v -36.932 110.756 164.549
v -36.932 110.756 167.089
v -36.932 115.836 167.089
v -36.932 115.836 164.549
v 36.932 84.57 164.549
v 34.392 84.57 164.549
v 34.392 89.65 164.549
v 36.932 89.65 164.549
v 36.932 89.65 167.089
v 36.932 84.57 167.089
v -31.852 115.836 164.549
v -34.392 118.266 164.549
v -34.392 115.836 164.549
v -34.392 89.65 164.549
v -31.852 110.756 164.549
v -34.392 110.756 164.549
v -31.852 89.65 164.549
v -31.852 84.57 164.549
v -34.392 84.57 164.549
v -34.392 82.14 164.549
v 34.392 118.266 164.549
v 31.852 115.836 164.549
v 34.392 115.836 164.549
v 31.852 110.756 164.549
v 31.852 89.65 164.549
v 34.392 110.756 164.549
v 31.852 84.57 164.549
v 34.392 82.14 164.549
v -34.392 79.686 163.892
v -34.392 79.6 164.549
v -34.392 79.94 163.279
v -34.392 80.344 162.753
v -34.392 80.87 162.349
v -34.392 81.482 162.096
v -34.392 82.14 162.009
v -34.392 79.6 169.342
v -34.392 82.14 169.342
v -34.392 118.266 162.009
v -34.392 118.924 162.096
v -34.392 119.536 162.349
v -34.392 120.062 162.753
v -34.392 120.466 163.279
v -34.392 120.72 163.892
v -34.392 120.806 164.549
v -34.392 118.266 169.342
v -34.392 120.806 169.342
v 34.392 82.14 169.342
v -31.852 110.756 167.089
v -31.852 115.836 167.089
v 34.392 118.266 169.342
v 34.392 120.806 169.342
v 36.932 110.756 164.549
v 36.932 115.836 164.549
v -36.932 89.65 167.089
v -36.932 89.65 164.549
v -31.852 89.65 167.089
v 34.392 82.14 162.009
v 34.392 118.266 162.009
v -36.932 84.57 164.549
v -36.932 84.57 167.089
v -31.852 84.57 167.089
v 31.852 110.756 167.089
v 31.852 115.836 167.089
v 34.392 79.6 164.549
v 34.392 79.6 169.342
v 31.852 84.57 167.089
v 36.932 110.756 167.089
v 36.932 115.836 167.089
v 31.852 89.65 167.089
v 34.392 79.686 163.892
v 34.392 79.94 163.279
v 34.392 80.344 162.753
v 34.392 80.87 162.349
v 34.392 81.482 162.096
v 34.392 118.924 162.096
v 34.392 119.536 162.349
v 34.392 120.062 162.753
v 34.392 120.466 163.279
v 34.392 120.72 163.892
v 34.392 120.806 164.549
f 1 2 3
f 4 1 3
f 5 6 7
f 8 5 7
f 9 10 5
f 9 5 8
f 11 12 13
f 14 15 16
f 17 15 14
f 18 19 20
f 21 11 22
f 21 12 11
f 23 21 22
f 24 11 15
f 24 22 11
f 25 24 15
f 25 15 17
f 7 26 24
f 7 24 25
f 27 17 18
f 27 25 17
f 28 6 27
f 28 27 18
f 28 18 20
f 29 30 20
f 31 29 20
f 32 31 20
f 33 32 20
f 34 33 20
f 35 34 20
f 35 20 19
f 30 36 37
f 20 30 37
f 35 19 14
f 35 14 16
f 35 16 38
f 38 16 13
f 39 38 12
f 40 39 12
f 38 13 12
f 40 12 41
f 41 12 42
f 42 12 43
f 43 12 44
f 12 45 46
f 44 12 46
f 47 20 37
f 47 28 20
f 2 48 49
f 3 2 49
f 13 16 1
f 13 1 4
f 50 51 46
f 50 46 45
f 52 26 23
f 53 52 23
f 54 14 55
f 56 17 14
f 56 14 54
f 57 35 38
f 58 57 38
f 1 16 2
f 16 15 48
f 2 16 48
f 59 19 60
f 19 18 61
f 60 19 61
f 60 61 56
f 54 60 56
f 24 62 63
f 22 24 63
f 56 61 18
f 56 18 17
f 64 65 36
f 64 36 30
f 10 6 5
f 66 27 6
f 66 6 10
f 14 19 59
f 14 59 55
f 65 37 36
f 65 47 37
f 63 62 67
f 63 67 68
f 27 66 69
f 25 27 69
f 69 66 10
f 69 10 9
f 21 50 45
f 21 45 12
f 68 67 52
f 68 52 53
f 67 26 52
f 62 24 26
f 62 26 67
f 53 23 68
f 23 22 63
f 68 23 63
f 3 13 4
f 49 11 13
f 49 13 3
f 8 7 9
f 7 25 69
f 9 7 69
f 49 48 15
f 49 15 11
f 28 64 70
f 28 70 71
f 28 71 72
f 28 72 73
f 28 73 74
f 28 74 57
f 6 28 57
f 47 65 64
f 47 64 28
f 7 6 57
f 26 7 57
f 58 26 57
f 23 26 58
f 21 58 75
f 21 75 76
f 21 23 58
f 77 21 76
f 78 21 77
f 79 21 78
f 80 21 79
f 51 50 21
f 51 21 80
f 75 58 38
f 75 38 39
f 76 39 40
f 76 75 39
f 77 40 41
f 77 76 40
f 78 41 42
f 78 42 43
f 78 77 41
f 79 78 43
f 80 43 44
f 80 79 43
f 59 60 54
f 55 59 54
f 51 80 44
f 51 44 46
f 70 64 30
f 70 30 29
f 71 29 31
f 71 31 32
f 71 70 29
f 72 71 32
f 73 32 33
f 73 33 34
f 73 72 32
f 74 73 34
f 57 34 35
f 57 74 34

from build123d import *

# Parameters (mm, degrees)
F1_DEPTH = 34.3916
F2_START = 31.8516
F0_W     = 5.08
F0_H     = 2.54
F2_DEPTH = 5.08
F3_START = -31.8516
F3_DEPTH = 5.08


with BuildPart() as f1:
    # F0 (on Right) → F1 (new body, symmetric)
    with BuildSketch(Plane.YZ):
        with BuildLine():
            Line((82.1398573303, 169.3418), (79.5998573303, 169.3418))
            Line((79.5998573303, 169.3418), (79.5998573303, 164.5491375))
            ThreePointArc((79.5998573303, 164.5491375), (80.3438061061, 162.7530862758), (82.1398573303, 162.0091375))
            Line((82.1398573303, 162.0091375), (100.203, 162.0091375))
            Line((100.203, 162.0091375), (100.203, 164.5491375))
            Line((100.203, 164.5491375), (89.6502663064, 164.5491375))
            Line((89.6502663064, 164.5491375), (84.5702663064, 164.5491375))
            Line((84.5702663064, 164.5491375), (82.1398573303, 164.5491375))
            Line((82.1398573303, 164.5491375), (82.1398573303, 169.3418))
        make_face()
        with BuildLine():
            Line((120.8061426697, 169.3418), (118.2661426697, 169.3418))
            Line((118.2661426697, 169.3418), (118.2661426697, 164.5491375))
            Line((118.2661426697, 164.5491375), (115.8357336936, 164.5491375))
            Line((115.8357336936, 164.5491375), (110.7557336936, 164.5491375))
            Line((110.7557336936, 164.5491375), (100.203, 164.5491375))
            Line((100.203, 164.5491375), (100.203, 162.0091375))
            Line((100.203, 162.0091375), (118.2661426697, 162.0091375))
            ThreePointArc((118.2661426697, 162.0091375), (120.0621938939, 162.7530862758), (120.8061426697, 164.5491375))
            Line((120.8061426697, 164.5491375), (120.8061426697, 169.3418))
        make_face()
    extrude(amount=F1_DEPTH, both=True)

    # F0 (on Right) → F2 (join)
    with BuildSketch(Plane.YZ.offset(F2_START)):
        with Locations((87.1102663064, 165.8191375)):
            Rectangle(F0_W, F0_H)
        with Locations((113.2957336936, 165.8191375)):
            Rectangle(F0_W, F0_H)
    extrude(amount=F2_DEPTH)

    # F0 (on Right) → F3 (join)
    with BuildSketch(Plane.YZ.offset(F3_START)):
        with Locations((87.1102663064, 165.8191375)):
            Rectangle(F0_W, F0_H)
        with Locations((113.2957336936, 165.8191375)):
            Rectangle(F0_W, F0_H)
    extrude(amount=-F3_DEPTH)


solid = f1.part
